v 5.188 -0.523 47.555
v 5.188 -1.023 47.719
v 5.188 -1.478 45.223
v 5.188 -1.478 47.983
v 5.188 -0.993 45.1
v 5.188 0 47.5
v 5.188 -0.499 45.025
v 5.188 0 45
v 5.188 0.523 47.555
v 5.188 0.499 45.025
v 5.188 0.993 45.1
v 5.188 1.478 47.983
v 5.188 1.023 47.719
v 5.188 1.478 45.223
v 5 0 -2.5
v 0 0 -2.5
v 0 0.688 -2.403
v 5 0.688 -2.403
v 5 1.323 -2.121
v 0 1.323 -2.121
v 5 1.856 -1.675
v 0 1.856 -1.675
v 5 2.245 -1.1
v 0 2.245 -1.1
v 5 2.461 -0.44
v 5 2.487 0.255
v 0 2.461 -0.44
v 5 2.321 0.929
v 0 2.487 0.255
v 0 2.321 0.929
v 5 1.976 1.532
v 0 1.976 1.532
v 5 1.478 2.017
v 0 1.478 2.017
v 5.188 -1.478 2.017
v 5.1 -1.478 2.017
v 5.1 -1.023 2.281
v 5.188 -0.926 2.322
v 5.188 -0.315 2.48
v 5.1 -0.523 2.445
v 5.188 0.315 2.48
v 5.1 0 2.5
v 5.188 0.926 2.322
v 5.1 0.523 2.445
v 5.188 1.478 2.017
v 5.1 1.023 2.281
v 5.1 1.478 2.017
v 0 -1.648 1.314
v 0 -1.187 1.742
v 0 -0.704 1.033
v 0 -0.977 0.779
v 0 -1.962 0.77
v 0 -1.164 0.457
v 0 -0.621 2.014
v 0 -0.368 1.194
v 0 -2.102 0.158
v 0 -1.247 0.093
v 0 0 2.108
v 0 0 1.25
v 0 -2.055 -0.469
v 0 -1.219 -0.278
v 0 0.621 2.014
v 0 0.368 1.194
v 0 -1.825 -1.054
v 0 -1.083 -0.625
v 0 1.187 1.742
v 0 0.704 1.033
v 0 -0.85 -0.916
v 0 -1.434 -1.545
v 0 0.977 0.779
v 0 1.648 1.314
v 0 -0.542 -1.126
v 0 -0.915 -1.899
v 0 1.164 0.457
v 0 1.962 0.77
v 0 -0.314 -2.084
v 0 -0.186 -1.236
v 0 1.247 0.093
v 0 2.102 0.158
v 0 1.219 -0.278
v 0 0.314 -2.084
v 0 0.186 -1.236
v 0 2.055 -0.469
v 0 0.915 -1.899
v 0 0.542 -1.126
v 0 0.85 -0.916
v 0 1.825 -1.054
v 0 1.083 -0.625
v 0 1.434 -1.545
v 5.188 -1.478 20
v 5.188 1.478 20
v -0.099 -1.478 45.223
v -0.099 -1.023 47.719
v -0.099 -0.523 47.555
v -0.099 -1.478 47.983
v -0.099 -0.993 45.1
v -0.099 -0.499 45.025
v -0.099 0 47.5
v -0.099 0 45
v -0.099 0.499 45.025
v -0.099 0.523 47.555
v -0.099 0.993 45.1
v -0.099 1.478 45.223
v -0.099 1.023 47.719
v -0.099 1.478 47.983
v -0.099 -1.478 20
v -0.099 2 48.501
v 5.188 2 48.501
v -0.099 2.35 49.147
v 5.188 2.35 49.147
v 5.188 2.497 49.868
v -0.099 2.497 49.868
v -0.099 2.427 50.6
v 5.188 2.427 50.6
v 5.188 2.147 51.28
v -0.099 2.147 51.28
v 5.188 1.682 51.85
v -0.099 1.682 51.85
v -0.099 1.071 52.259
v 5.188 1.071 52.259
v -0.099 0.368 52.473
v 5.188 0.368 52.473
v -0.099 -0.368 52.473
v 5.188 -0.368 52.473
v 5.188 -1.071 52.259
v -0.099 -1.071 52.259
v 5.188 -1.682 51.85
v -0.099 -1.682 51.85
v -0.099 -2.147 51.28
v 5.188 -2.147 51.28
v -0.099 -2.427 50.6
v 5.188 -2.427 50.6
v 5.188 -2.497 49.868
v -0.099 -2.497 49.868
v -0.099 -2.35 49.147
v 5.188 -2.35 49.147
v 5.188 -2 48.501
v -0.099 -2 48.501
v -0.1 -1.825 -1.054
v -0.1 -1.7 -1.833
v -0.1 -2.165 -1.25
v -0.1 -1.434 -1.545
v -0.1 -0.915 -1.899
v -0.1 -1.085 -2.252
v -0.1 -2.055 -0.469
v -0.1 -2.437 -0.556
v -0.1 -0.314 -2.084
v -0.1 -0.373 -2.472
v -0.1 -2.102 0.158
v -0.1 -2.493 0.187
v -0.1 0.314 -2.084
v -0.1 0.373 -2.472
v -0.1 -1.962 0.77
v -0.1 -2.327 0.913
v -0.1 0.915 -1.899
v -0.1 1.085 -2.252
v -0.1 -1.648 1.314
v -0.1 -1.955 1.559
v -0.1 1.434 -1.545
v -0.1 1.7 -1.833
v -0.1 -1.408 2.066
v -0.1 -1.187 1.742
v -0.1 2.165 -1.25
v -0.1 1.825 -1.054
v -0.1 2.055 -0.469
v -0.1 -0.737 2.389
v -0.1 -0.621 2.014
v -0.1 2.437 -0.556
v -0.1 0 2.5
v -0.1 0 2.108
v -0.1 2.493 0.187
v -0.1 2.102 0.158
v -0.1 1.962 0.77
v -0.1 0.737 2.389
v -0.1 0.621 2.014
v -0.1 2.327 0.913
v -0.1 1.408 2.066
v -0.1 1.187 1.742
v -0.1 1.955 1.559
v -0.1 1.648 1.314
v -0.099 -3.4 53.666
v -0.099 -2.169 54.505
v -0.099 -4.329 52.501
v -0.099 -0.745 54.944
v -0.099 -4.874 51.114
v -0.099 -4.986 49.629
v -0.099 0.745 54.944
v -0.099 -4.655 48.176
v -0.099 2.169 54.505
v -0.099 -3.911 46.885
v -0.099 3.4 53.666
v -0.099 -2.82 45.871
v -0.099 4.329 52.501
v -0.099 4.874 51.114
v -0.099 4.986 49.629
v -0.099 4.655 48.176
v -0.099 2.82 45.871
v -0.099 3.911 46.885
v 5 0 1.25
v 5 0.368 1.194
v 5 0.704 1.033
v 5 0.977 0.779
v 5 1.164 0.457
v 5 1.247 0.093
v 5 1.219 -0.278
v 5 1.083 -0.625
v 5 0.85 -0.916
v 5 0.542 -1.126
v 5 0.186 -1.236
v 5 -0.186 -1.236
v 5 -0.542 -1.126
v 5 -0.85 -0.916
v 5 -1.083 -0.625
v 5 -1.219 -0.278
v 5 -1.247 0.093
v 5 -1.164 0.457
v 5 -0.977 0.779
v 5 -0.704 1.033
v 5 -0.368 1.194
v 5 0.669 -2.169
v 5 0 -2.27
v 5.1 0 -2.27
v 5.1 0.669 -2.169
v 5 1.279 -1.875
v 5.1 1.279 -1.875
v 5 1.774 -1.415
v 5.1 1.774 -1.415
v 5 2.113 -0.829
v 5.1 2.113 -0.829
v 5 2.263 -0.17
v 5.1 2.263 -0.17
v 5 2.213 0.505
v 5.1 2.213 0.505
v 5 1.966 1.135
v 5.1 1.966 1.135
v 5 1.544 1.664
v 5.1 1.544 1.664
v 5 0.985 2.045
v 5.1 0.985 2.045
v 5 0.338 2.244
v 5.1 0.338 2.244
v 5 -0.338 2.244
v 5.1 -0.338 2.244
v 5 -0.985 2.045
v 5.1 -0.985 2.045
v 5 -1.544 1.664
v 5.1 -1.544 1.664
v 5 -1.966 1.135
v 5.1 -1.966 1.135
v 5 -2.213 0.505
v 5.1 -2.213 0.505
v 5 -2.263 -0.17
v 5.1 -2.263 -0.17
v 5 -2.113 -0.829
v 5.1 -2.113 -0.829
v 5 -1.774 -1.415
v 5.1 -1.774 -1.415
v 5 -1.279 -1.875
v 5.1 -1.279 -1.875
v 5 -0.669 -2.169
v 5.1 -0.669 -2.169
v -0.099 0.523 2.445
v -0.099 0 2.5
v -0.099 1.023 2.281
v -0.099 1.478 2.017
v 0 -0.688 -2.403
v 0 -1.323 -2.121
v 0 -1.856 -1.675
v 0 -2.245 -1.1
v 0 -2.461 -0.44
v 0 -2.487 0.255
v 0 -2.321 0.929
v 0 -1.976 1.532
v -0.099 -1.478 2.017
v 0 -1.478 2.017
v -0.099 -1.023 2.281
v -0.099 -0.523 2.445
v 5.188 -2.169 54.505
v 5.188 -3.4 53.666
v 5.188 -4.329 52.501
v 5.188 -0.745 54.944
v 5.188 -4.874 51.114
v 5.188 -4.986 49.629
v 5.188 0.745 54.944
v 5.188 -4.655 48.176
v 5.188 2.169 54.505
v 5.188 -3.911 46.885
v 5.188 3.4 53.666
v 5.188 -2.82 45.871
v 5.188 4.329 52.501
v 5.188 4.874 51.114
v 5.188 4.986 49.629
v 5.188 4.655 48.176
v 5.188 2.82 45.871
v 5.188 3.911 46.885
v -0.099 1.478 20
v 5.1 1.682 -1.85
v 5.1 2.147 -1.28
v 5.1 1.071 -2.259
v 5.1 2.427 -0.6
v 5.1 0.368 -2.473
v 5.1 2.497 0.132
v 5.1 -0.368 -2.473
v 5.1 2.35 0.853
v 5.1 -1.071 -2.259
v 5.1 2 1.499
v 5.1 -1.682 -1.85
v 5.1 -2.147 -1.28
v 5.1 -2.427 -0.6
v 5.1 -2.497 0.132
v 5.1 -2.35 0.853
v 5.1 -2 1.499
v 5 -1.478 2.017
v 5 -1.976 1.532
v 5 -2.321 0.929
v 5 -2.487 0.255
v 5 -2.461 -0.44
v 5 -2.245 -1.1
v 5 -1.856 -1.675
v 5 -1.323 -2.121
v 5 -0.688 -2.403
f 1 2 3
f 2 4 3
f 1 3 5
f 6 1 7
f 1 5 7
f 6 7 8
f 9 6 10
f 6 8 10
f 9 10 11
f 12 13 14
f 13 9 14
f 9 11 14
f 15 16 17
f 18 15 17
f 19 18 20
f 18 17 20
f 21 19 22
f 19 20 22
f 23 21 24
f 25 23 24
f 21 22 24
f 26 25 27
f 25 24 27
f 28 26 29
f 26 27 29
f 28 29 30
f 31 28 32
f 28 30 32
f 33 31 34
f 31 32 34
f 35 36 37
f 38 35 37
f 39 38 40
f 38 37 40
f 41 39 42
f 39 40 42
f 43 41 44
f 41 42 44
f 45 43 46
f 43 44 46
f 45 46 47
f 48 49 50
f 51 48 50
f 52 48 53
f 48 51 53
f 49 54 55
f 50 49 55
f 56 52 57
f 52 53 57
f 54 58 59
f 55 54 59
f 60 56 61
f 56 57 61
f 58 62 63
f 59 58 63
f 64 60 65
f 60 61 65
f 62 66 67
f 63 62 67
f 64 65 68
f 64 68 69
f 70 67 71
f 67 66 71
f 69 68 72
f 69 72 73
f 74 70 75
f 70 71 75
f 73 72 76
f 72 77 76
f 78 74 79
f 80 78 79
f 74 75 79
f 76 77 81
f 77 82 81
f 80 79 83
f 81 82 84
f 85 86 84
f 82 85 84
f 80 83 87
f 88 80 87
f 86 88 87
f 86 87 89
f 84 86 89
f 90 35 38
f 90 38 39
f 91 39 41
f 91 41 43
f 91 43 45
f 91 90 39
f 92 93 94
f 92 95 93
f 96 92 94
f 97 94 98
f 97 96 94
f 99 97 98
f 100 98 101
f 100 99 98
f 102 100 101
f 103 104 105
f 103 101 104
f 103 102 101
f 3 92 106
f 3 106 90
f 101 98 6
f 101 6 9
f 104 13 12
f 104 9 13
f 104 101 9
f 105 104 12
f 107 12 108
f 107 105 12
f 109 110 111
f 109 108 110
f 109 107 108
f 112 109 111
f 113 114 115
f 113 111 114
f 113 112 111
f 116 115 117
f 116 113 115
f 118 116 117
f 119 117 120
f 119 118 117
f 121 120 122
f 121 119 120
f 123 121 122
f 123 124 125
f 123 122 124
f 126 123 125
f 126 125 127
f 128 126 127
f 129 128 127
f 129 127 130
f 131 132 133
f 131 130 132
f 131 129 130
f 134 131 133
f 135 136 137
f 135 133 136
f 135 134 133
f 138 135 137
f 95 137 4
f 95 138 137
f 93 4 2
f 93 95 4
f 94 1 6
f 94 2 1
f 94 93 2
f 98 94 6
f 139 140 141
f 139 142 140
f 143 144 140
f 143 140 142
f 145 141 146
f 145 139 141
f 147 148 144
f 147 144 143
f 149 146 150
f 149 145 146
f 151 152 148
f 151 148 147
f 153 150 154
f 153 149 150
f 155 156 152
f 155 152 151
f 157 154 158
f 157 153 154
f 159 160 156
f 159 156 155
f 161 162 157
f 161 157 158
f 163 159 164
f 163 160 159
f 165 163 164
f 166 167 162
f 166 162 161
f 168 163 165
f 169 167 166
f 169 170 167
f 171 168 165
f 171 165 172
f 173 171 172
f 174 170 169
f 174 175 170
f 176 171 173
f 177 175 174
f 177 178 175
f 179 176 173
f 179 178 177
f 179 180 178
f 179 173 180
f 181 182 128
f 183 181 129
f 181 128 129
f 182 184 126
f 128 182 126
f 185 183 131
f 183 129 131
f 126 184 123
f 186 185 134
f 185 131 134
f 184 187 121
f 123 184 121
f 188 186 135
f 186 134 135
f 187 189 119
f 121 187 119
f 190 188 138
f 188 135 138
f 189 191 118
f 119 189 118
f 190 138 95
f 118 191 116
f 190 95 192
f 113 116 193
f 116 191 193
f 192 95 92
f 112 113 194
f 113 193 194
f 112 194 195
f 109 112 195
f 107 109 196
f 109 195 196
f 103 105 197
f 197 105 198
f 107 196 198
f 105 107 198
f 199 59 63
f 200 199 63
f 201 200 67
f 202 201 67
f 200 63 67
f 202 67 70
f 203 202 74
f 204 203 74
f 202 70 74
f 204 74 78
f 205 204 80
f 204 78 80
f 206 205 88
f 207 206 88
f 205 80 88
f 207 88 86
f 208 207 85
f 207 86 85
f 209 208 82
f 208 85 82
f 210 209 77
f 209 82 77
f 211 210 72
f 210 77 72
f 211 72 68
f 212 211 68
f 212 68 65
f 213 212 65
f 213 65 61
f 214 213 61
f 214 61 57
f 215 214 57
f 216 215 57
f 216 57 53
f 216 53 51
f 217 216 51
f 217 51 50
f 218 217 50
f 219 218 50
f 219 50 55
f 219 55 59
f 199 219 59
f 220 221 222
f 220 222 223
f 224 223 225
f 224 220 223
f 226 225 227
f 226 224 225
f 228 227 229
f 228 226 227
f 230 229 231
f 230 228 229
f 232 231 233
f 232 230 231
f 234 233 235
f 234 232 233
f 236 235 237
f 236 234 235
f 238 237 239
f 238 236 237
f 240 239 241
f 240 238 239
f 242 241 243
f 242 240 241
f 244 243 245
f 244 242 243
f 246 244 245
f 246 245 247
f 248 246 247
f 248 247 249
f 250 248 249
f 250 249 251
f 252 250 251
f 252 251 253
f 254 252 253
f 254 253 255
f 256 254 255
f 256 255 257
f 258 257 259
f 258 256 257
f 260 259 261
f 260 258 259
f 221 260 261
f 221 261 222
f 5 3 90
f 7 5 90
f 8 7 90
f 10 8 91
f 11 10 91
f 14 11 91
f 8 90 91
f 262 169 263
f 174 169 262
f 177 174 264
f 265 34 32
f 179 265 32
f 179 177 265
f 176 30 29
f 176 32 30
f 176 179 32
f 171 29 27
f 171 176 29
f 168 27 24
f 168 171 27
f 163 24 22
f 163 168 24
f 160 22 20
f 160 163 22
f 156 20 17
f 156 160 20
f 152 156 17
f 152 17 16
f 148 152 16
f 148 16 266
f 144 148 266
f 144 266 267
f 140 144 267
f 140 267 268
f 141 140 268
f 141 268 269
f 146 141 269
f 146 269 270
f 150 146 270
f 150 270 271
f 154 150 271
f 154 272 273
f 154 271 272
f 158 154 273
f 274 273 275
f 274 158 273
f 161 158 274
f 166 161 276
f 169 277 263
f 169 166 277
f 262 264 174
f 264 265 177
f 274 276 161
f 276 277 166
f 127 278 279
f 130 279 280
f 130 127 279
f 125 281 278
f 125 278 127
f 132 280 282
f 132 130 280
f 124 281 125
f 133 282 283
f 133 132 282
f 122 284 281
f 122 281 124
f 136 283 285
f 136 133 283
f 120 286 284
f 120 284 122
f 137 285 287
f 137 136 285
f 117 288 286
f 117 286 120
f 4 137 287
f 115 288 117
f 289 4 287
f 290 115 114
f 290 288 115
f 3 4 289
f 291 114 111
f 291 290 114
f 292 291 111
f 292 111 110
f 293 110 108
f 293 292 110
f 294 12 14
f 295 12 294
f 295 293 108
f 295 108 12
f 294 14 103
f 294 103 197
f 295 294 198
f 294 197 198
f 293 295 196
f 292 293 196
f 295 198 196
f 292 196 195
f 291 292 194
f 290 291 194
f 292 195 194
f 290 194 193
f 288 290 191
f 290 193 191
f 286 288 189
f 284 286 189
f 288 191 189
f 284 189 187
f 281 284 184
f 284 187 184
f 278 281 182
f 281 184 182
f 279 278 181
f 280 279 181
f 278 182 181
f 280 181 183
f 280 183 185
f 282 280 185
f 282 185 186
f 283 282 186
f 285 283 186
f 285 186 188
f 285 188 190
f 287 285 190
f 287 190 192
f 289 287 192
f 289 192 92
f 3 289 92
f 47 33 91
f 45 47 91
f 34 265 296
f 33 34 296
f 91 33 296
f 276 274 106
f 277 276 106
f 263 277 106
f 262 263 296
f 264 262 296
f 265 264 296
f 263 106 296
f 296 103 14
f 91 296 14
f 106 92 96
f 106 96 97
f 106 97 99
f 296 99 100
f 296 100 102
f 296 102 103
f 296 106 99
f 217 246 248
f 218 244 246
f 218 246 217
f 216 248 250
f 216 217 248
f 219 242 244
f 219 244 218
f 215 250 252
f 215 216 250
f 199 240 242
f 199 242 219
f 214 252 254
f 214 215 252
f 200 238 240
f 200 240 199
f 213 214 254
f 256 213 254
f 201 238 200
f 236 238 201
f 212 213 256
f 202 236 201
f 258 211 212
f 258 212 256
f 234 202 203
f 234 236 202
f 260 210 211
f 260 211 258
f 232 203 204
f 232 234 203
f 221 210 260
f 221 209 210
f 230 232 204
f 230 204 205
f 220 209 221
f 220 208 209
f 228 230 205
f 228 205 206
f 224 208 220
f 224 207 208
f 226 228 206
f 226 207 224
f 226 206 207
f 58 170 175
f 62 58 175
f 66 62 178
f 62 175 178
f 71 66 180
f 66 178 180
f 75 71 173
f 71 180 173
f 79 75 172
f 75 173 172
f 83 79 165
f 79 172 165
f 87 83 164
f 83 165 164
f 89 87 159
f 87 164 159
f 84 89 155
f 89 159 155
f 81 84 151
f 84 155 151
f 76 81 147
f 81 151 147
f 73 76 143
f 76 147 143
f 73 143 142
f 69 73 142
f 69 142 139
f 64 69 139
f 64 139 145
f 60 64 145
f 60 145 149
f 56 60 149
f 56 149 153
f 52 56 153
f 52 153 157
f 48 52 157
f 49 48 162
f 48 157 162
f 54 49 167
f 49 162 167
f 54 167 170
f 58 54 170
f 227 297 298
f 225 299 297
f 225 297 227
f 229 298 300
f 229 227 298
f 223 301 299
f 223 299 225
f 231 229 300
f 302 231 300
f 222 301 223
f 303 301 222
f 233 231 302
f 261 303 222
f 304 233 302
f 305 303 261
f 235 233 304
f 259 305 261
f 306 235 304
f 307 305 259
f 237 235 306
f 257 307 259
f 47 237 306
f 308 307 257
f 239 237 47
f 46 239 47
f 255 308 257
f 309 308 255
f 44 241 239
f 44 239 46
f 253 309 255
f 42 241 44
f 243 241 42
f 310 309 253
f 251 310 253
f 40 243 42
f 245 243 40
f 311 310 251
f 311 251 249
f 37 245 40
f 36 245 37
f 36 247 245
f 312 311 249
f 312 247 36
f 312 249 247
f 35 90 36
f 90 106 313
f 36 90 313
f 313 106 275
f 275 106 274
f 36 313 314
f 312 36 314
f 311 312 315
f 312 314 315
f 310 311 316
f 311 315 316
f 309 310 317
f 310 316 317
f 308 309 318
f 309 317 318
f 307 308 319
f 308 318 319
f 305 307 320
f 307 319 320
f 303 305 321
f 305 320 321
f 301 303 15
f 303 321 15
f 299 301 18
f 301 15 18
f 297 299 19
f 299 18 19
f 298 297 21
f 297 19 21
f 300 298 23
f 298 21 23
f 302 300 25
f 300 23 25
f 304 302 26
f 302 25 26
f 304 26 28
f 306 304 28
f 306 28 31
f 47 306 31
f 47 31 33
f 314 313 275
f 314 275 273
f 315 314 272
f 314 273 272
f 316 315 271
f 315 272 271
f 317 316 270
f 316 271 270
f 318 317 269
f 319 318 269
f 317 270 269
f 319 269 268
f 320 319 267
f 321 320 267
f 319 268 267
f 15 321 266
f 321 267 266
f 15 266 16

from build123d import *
from build123d.topology import SkipClean

# Parameters (mm, degrees)
SKETCH1_R               = 2.5
BOSS_EXTRUDE1_DEPTH     = 5
SKETCH2_R               = 1.25
CUT_EXTRUDE1_DEPTH      = 10
BOSS_EXTRUDE2_START     = 0.1
SKETCH4_R               = 2.5
SKETCH4_R_2             = 2.107798696
BOSS_EXTRUDE2_DEPTH     = 0.1
SKETCH5_R               = 2.5
SKETCH5_R_2             = 2.269592882
BOSS_EXTRUDE3_DEPTH     = 0.1
BOSS_EXTRUDE5_START     = -0.098685172
BOSS_EXTRUDE5_DEPTH     = 5.286540914
SKETCH12_W              = 5.286540914
SKETCH12_H              = 2.95536745
BOSS_EXTRUDE6_DEPTH     = 30
BOSS_EXTRUDE7_START     = -5.286541
SKETCH13_R              = 5
BOSS_EXTRUDE7_DEPTH     = 5.286541
CUT_EXTRUDE2_DEPTH      = 56.479378316
CUT_EXTRUDE2_DEPTH_BACK = 56.479378316
SKETCH14_R              = 2.5


# Read off the part's stored shape, not the designer's step: Boss-Extrude5
with BuildPart() as part:
    # Sketch1 → Boss-Extrude1 (new body)
    with BuildSketch(Plane(origin=(0, 0, 0), x_dir=(0, 0, -1), z_dir=(1, 0, 0))):
        Circle(SKETCH1_R)
    extrude(amount=BOSS_EXTRUDE1_DEPTH)

    # Sketch2 → Cut-Extrude1 (cut)
    with BuildSketch(Plane.ZY):
        Circle(SKETCH2_R)
    extrude(amount=-CUT_EXTRUDE1_DEPTH, mode=Mode.SUBTRACT)

    # Sketch4 → Boss-Extrude2 (add)
    with BuildSketch(Plane.ZY.offset(BOSS_EXTRUDE2_START)):
        Circle(SKETCH4_R)
        Circle(SKETCH4_R_2, mode=Mode.SUBTRACT)
    extrude(amount=-BOSS_EXTRUDE2_DEPTH)

    # Sketch5 → Boss-Extrude3 (add)
    with BuildSketch(Plane(origin=(5, 0, 0), x_dir=(0, 0, -1), z_dir=(1, 0, 0))):
        with Locations(Location((0, 0, 0), (0, 0, 180))):
            Circle(SKETCH5_R)
        Circle(SKETCH5_R_2, mode=Mode.SUBTRACT)
    extrude(amount=BOSS_EXTRUDE3_DEPTH)

    # Boss-Extrude5 outline → Boss-Extrude5 (add)
    with SkipClean():  # the faces are left unmerged after this step: merging them gives an invalid solid
        with BuildSketch(Plane.YZ.offset(BOSS_EXTRUDE5_START)):
            with BuildLine():
                Line((-1.477683725, 20), (-1.477683725, 2.016544274))
                ThreePointArc((-1.477683725, 2.016544274), (0, 2.5), (1.477683725, 2.016544274))
                Line((1.477683725, 2.016544274), (1.477683725, 20))
                Line((1.477683725, 20), (-1.477683725, 20))
            make_face()
        extrude(amount=BOSS_EXTRUDE5_DEPTH)

    # Sketch12 → Boss-Extrude6 (add)
    with SkipClean():  # the faces are left unmerged after this step: merging them gives an invalid solid
        with BuildSketch(Plane.XY.offset(20)):
            with Locations((2.544585285, 0)):
                Rectangle(SKETCH12_W, SKETCH12_H)
        extrude(amount=BOSS_EXTRUDE6_DEPTH)

    # Sketch13 → Boss-Extrude7 (add)
    with SkipClean():  # the faces are left unmerged after this step: merging them gives an invalid solid
        with BuildSketch(Plane(origin=(5.187855742, 0, 0), x_dir=(0, 0, -1), z_dir=(1, 0, 0)).offset(BOSS_EXTRUDE7_START)):
            with Locations((-50, 0)):
                Circle(SKETCH13_R)
        extrude(amount=BOSS_EXTRUDE7_DEPTH)

    # Sketch14 → Cut-Extrude2 (cut, two sides: drawn at the far end of the back side and taken through both)
    with SkipClean():  # the faces are left unmerged after this step: merging them gives an invalid solid
        with BuildSketch(Plane(origin=(5.187855742, 0, 0), x_dir=(0, 0, -1), z_dir=(1, 0, 0)).offset(-CUT_EXTRUDE2_DEPTH_BACK)):
            with Locations((-50, 0)):
                Circle(SKETCH14_R)
        extrude(amount=CUT_EXTRUDE2_DEPTH + CUT_EXTRUDE2_DEPTH_BACK, mode=Mode.SUBTRACT)


solid = part.part
